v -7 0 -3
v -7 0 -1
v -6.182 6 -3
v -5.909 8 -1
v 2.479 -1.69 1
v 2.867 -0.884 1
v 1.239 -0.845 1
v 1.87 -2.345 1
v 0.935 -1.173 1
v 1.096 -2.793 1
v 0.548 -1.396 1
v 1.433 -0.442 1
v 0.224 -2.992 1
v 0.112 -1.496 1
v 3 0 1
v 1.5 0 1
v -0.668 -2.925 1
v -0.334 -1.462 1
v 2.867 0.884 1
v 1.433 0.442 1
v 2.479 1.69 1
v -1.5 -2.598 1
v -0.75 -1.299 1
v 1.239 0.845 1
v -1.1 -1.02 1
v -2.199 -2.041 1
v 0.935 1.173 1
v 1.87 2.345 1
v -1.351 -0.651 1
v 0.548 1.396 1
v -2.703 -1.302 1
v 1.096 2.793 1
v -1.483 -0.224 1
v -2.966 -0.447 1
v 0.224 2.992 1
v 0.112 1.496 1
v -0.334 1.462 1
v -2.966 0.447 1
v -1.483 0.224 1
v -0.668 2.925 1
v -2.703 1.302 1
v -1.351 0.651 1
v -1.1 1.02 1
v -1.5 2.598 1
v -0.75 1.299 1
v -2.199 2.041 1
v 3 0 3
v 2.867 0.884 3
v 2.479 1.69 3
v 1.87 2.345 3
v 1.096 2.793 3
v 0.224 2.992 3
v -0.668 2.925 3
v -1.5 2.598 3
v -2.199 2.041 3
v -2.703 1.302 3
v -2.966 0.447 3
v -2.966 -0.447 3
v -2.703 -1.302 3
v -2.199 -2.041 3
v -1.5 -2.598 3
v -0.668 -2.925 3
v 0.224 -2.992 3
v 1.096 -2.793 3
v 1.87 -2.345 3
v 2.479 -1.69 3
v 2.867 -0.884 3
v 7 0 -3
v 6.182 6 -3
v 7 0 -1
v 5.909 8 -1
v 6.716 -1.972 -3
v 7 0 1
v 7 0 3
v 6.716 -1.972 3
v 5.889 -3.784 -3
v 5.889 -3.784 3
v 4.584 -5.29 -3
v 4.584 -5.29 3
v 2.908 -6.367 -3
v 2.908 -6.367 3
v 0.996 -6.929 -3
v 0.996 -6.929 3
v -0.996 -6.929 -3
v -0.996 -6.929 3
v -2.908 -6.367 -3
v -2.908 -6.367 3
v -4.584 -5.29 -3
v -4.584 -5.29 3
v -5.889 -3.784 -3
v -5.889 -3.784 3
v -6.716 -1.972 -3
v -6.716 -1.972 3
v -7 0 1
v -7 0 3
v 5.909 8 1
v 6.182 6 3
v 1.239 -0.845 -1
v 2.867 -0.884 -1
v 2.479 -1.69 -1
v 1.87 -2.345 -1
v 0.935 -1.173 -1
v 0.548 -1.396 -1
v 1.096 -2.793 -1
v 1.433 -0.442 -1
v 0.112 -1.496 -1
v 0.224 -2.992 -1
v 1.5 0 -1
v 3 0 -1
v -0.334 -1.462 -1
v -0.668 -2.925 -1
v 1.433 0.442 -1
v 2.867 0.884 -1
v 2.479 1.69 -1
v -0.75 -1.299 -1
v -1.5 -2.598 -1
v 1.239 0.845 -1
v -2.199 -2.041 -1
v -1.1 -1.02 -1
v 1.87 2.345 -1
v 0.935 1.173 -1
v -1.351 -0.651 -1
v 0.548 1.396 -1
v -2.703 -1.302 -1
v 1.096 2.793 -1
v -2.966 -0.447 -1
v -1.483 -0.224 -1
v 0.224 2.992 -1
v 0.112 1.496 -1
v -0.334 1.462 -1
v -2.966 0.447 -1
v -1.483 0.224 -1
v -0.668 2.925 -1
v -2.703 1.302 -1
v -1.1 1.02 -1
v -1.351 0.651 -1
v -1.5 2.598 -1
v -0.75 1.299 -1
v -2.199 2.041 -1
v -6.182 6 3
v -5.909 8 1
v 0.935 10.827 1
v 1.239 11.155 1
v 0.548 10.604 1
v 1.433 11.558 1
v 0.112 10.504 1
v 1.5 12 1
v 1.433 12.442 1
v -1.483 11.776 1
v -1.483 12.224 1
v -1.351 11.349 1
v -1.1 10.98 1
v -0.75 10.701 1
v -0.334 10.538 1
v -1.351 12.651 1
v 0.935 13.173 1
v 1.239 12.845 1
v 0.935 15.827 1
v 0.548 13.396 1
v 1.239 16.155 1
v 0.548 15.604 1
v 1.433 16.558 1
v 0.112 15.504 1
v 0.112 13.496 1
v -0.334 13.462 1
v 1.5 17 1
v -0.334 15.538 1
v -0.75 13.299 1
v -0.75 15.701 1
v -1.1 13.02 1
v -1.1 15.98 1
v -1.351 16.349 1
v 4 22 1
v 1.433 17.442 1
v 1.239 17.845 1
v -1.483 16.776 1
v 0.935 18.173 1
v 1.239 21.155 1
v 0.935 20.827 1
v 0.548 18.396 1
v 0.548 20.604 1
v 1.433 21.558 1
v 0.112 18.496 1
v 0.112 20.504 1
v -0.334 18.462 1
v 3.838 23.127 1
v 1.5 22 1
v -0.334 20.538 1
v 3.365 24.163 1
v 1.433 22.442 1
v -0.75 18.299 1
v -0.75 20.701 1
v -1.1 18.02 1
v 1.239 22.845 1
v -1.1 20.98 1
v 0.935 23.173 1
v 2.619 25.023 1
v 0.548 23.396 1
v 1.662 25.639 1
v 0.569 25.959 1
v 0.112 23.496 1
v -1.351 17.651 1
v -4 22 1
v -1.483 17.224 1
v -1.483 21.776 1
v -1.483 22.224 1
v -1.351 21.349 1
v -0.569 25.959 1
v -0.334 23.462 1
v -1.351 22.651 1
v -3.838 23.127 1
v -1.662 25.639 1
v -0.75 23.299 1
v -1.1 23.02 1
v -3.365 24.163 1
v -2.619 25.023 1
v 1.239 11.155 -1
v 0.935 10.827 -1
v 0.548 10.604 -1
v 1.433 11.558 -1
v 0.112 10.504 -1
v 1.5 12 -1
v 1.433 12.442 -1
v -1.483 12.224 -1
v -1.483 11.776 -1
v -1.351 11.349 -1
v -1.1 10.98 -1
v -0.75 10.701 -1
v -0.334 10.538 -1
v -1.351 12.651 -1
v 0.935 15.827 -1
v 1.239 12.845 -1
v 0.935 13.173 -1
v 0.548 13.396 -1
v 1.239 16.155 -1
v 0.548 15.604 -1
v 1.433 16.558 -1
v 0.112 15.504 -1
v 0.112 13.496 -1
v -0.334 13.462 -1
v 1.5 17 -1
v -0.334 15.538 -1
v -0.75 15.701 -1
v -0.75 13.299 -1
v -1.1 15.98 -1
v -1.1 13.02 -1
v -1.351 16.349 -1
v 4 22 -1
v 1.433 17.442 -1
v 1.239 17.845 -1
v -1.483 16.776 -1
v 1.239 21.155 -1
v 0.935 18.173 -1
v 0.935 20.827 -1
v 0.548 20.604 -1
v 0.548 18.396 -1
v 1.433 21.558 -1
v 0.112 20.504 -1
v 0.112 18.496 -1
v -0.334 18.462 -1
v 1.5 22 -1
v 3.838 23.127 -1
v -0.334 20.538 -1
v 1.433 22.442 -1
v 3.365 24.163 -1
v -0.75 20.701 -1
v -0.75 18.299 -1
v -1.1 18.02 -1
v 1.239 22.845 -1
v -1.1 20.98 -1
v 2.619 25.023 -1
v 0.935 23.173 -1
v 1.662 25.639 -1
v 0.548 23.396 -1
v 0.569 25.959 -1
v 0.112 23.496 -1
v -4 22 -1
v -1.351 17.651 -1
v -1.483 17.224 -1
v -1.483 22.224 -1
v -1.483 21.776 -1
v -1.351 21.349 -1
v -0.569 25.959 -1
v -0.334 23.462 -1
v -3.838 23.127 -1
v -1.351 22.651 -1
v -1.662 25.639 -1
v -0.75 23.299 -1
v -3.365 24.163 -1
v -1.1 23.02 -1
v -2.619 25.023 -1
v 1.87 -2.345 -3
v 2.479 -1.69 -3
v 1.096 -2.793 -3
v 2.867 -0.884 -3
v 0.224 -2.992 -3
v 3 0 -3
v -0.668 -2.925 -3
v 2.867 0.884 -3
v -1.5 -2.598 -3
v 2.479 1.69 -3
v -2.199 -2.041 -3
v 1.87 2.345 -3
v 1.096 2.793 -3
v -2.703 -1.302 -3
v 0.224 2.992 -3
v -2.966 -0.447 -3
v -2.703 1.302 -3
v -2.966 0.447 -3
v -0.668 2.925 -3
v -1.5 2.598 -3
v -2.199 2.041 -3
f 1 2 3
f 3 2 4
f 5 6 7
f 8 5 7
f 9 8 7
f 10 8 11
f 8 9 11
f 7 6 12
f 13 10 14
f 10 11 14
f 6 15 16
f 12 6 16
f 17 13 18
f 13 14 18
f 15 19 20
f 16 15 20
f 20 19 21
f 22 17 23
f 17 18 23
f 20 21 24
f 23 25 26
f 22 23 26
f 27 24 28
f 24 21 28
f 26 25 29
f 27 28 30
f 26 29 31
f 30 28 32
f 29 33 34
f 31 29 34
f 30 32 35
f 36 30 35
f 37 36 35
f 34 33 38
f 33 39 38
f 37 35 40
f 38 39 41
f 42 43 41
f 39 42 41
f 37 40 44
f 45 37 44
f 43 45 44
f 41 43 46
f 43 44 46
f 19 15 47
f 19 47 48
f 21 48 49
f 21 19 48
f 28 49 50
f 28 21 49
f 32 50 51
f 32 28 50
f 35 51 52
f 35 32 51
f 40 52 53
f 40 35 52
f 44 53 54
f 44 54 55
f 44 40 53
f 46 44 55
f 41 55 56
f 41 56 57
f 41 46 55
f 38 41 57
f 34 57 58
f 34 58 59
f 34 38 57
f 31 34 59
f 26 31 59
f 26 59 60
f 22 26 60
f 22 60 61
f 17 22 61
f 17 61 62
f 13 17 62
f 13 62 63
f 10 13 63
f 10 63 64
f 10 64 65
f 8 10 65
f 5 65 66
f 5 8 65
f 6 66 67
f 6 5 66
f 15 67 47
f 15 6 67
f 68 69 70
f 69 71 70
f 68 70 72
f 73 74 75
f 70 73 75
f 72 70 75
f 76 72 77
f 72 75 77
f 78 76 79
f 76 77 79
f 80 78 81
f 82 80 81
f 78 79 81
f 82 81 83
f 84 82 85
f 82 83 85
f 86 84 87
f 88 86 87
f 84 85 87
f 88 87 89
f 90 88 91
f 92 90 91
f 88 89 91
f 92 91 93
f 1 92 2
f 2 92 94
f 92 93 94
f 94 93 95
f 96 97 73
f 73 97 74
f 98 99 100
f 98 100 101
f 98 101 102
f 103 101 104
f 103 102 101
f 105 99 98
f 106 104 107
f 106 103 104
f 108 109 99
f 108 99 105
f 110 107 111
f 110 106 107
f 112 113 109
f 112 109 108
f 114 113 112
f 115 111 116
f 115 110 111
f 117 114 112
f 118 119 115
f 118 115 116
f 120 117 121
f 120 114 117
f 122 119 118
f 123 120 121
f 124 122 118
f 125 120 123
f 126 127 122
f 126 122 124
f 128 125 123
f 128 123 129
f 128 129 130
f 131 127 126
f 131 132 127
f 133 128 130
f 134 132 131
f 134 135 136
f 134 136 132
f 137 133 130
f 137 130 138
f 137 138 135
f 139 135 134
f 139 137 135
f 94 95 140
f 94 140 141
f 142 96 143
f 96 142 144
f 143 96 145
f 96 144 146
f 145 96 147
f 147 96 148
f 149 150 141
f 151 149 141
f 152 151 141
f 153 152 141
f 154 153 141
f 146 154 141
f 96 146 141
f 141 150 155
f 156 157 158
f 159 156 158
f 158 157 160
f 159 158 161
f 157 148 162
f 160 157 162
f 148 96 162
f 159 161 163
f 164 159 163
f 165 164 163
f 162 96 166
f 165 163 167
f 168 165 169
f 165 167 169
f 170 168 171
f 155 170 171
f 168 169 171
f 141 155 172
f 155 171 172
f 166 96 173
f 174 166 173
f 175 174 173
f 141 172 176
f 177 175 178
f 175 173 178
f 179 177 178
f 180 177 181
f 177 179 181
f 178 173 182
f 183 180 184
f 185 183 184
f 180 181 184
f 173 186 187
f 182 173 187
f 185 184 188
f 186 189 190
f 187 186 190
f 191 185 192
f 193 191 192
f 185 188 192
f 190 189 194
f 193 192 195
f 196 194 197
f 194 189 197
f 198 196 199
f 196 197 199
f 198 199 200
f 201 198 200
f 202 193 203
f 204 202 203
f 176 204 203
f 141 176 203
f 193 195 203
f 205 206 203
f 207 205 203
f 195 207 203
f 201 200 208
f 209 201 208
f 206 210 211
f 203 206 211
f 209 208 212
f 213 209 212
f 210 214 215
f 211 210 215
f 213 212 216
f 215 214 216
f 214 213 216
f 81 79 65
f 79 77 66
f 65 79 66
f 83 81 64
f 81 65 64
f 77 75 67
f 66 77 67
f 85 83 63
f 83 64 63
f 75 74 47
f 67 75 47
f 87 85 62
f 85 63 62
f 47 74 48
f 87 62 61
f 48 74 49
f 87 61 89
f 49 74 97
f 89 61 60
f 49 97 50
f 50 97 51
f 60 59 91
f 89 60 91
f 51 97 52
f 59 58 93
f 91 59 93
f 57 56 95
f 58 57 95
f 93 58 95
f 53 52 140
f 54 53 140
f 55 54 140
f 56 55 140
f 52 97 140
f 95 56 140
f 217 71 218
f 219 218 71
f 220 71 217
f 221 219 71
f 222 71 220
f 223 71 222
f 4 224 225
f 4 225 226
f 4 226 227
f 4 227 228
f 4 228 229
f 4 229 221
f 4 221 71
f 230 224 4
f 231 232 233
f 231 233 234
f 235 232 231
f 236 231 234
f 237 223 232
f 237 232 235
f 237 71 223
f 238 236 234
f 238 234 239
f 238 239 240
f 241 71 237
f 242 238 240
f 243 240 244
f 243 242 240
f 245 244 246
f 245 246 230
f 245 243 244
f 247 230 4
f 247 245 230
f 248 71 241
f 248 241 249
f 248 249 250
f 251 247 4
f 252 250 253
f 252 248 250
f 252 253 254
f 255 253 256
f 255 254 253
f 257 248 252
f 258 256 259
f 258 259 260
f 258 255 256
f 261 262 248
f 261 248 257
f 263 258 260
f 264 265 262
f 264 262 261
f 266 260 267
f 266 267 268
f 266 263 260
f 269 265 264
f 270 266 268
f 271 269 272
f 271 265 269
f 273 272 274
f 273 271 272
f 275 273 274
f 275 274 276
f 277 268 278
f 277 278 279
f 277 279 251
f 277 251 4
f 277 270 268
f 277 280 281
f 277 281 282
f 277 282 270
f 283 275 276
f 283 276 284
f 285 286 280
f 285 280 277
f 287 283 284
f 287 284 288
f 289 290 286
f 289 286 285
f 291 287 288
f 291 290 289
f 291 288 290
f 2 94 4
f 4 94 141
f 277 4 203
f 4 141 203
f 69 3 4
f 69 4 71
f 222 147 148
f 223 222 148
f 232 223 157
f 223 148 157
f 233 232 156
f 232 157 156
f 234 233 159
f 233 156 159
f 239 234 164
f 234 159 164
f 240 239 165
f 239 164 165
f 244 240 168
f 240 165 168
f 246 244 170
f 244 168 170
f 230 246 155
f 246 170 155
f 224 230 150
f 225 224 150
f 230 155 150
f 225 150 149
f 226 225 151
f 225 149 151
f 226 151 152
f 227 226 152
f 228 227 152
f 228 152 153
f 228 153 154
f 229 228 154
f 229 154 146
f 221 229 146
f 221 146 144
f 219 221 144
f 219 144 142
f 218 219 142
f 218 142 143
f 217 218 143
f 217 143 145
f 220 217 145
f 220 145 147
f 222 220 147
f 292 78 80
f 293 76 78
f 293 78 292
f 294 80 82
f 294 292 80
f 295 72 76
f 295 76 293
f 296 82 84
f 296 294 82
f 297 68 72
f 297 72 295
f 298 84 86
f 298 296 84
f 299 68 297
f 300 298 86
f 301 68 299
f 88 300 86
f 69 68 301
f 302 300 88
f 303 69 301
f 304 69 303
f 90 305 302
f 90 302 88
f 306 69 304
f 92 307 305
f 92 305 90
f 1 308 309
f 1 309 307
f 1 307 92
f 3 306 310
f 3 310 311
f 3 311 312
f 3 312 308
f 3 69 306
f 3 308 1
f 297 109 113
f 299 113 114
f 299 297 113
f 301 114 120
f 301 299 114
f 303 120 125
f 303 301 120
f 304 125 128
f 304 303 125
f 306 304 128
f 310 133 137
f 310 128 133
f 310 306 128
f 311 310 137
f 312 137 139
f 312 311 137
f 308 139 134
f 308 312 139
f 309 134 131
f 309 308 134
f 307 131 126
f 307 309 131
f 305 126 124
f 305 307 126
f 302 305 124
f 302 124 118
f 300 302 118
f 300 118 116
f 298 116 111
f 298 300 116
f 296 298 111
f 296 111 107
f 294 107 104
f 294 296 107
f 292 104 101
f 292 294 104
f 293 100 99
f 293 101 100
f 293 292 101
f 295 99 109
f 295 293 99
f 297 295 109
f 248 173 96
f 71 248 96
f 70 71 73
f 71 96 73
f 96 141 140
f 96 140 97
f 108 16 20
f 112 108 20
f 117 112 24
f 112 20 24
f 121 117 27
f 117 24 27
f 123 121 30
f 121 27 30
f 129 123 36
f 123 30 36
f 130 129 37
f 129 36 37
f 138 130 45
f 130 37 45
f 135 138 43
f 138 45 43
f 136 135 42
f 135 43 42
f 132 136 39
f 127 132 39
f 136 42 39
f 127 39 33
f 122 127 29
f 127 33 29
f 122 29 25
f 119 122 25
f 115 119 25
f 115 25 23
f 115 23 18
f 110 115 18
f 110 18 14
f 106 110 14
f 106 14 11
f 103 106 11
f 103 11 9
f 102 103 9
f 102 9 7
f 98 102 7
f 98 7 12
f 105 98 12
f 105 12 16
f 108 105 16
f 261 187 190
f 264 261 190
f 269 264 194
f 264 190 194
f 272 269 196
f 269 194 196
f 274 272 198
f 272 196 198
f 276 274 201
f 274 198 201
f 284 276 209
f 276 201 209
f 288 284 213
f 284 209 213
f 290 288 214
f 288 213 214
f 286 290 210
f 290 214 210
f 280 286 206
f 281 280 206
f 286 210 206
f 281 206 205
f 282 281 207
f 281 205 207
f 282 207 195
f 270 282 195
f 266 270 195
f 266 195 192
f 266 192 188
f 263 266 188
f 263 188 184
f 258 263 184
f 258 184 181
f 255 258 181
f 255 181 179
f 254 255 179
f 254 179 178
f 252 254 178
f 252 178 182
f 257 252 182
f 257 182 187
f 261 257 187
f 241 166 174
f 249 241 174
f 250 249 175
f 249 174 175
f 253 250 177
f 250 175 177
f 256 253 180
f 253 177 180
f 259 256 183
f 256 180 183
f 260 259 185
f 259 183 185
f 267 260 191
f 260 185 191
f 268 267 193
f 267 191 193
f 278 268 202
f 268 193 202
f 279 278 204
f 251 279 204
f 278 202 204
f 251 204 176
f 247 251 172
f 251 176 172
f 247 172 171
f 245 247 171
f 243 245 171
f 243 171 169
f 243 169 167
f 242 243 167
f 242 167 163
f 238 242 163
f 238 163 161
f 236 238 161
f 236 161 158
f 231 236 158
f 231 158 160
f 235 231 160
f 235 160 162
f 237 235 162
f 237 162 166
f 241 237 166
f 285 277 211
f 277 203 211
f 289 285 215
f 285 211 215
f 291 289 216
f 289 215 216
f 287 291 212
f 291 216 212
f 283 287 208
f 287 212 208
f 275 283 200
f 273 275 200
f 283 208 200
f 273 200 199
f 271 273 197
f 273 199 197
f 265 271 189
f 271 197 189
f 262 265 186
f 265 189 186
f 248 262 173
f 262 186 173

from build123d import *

# Parameters (mm, degrees)
BOSS_EXTRUDE1_DEPTH = 1
SKETCH2_R           = 3
BOSS_EXTRUDE2_DEPTH = 3
CHAMFER1_SIZE       = 2
SKETCH3_R           = 1.5
CUT_EXTRUDE1_DEPTH  = 28.221315178
SKETCH4_R           = 1.5
CUT_EXTRUDE2_DEPTH  = 28.221315178


with BuildPart() as part:
    # Sketch1 → Boss-Extrude1 (new, symmetric)
    with BuildSketch(Plane.XY):
        with BuildLine():
            Line((-7, 0), (-4, 22))
            ThreePointArc((-4, 22), (0, 26), (4, 22))
            Line((4, 22), (7, 0))
            ThreePointArc((7, 0), (0, -7), (-7, 0))
        make_face()
    extrude(amount=BOSS_EXTRUDE1_DEPTH, both=True)

    # Sketch2 → Boss-Extrude2 (add, symmetric)
    with BuildSketch(Plane.XY):
        with BuildLine():
            Line((-5.909090909, 8), (5.909090909, 8))
            Line((5.909090909, 8), (7, 0))
            ThreePointArc((7, 0), (0, -7), (-7, 0))
            Line((-7, 0), (-5.909090909, 8))
        make_face()
        Circle(SKETCH2_R, mode=Mode.SUBTRACT)
    extrude(amount=BOSS_EXTRUDE2_DEPTH, both=True)

    # Chamfer1
    chamfer1_edges = [part.edges().sort_by_distance(p)[0] for p in [
        (0, 8, -3),
        (0, 8, 3),
    ]]
    chamfer(chamfer1_edges, length=CHAMFER1_SIZE - 0.0001)  # a hair under: the kernel refuses the full size

    # Sketch3 → Cut-Extrude1 (cut, through all)
    with BuildSketch(Plane.XY.offset(1)):
        with Locations((0, 22)):
            Circle(SKETCH3_R)
        with Locations((0, 17)):
            Circle(SKETCH3_R)
        with Locations((0, 12)):
            Circle(SKETCH3_R)
    extrude(amount=-CUT_EXTRUDE1_DEPTH, mode=Mode.SUBTRACT)

    # Sketch4 → Cut-Extrude2 (cut, through all)
    with BuildSketch(Plane.XY.offset(1)):
        Circle(SKETCH4_R)
    extrude(amount=-CUT_EXTRUDE2_DEPTH, mode=Mode.SUBTRACT)


solid = part.part
